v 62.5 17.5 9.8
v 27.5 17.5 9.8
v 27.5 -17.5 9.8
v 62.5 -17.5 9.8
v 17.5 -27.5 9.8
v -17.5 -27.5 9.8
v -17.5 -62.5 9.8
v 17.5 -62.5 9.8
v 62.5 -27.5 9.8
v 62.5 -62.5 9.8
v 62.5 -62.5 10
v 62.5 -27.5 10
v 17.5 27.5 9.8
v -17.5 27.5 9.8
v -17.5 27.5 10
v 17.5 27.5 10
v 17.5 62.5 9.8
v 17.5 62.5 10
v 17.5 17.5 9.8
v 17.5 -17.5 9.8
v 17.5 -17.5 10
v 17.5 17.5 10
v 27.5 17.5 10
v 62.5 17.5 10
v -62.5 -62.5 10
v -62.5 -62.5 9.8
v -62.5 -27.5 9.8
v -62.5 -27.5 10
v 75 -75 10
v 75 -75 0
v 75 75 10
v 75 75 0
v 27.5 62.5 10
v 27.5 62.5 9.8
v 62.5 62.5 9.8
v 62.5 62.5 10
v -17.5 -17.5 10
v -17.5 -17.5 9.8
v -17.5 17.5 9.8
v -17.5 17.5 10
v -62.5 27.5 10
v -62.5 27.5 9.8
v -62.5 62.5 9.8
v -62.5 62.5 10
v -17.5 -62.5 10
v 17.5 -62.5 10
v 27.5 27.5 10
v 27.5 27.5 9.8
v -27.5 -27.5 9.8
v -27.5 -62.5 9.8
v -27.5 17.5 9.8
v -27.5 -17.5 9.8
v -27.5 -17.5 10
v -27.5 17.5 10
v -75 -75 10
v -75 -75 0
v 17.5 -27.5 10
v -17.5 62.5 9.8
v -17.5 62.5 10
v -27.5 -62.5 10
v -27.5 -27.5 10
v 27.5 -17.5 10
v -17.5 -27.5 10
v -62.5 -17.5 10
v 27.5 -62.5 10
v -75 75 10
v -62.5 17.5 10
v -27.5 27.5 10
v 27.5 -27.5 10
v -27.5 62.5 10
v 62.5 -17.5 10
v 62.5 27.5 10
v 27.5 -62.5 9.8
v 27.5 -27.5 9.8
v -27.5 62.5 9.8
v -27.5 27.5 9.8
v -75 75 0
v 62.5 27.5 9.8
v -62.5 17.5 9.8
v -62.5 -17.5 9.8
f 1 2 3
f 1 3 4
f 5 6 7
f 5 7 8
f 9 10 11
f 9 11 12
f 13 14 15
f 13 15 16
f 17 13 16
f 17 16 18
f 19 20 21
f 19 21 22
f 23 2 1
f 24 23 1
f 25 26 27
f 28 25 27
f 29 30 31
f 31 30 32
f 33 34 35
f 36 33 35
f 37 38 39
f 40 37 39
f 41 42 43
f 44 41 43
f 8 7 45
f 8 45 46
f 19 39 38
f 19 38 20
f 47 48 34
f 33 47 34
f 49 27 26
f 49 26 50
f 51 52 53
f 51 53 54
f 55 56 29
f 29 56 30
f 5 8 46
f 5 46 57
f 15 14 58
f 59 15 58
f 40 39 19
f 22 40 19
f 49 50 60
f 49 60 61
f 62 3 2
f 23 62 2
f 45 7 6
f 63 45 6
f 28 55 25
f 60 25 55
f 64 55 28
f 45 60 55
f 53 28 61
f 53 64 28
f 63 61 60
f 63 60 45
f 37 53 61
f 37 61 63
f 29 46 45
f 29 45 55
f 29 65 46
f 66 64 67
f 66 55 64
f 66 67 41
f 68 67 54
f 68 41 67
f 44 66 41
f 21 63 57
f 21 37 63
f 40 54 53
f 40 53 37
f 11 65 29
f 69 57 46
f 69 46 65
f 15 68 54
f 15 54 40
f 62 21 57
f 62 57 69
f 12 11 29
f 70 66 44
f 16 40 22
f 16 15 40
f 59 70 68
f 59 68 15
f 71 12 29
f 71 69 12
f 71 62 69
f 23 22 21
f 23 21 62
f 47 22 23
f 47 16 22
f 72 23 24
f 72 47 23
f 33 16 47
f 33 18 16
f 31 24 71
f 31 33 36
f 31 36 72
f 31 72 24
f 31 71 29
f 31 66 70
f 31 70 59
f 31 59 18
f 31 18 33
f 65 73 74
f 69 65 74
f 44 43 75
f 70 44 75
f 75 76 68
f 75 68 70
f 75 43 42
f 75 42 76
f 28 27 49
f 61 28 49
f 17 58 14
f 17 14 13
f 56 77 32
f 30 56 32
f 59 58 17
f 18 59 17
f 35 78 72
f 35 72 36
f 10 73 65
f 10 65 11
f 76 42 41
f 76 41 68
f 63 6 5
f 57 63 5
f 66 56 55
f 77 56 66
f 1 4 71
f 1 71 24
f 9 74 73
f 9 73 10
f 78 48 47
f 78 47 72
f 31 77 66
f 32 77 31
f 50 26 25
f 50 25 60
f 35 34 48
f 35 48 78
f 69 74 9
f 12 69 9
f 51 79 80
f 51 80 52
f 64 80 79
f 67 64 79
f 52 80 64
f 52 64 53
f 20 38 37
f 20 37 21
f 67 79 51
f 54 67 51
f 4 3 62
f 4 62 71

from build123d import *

# Parameters (mm, degrees)
F0_W     = 150
F0_H     = 150
F0_W_2   = 35
F0_H_2   = 35
F1_DEPTH = 10
F2_DEPTH = 9.8


with BuildPart() as f1:
    # F0 (on Top) → F1 (new body)
    with BuildSketch(Plane.XY):
        Rectangle(F0_W, F0_H)
        with Locations((-45, -45)):
            Rectangle(F0_W_2, F0_H_2, mode=Mode.SUBTRACT)
        with Locations((0, -45)):
            Rectangle(F0_W_2, F0_H_2, mode=Mode.SUBTRACT)
        with Locations((45, -45)):
            Rectangle(F0_W_2, F0_H_2, mode=Mode.SUBTRACT)
        with Locations((-45, 0)):
            Rectangle(F0_W_2, F0_H_2, mode=Mode.SUBTRACT)
        with Locations((-45, 45)):
            Rectangle(F0_W_2, F0_H_2, mode=Mode.SUBTRACT)
        Rectangle(F0_W_2, F0_H_2, mode=Mode.SUBTRACT)
        with Locations((45, 0)):
            Rectangle(F0_W_2, F0_H_2, mode=Mode.SUBTRACT)
        with Locations((0, 45)):
            Rectangle(F0_W_2, F0_H_2, mode=Mode.SUBTRACT)
        with Locations((45, 45)):
            Rectangle(F0_W_2, F0_H_2, mode=Mode.SUBTRACT)
    extrude(amount=F1_DEPTH)

    # F0 (on Top) → F2 (join)
    with BuildSketch(Plane.XY):
        with Locations((-45, 45)):
            Rectangle(F0_W_2, F0_H_2)
        with Locations((-45, 0)):
            Rectangle(F0_W_2, F0_H_2)
        with Locations((-45, -45)):
            Rectangle(F0_W_2, F0_H_2)
        with Locations((0, -45)):
            Rectangle(F0_W_2, F0_H_2)
        Rectangle(F0_W_2, F0_H_2)
        with Locations((0, 45)):
            Rectangle(F0_W_2, F0_H_2)
        with Locations((45, 45)):
            Rectangle(F0_W_2, F0_H_2)
        with Locations((45, 0)):
            Rectangle(F0_W_2, F0_H_2)
        with Locations((45, -45)):
            Rectangle(F0_W_2, F0_H_2)
    extrude(amount=F2_DEPTH)


solid = f1.part
